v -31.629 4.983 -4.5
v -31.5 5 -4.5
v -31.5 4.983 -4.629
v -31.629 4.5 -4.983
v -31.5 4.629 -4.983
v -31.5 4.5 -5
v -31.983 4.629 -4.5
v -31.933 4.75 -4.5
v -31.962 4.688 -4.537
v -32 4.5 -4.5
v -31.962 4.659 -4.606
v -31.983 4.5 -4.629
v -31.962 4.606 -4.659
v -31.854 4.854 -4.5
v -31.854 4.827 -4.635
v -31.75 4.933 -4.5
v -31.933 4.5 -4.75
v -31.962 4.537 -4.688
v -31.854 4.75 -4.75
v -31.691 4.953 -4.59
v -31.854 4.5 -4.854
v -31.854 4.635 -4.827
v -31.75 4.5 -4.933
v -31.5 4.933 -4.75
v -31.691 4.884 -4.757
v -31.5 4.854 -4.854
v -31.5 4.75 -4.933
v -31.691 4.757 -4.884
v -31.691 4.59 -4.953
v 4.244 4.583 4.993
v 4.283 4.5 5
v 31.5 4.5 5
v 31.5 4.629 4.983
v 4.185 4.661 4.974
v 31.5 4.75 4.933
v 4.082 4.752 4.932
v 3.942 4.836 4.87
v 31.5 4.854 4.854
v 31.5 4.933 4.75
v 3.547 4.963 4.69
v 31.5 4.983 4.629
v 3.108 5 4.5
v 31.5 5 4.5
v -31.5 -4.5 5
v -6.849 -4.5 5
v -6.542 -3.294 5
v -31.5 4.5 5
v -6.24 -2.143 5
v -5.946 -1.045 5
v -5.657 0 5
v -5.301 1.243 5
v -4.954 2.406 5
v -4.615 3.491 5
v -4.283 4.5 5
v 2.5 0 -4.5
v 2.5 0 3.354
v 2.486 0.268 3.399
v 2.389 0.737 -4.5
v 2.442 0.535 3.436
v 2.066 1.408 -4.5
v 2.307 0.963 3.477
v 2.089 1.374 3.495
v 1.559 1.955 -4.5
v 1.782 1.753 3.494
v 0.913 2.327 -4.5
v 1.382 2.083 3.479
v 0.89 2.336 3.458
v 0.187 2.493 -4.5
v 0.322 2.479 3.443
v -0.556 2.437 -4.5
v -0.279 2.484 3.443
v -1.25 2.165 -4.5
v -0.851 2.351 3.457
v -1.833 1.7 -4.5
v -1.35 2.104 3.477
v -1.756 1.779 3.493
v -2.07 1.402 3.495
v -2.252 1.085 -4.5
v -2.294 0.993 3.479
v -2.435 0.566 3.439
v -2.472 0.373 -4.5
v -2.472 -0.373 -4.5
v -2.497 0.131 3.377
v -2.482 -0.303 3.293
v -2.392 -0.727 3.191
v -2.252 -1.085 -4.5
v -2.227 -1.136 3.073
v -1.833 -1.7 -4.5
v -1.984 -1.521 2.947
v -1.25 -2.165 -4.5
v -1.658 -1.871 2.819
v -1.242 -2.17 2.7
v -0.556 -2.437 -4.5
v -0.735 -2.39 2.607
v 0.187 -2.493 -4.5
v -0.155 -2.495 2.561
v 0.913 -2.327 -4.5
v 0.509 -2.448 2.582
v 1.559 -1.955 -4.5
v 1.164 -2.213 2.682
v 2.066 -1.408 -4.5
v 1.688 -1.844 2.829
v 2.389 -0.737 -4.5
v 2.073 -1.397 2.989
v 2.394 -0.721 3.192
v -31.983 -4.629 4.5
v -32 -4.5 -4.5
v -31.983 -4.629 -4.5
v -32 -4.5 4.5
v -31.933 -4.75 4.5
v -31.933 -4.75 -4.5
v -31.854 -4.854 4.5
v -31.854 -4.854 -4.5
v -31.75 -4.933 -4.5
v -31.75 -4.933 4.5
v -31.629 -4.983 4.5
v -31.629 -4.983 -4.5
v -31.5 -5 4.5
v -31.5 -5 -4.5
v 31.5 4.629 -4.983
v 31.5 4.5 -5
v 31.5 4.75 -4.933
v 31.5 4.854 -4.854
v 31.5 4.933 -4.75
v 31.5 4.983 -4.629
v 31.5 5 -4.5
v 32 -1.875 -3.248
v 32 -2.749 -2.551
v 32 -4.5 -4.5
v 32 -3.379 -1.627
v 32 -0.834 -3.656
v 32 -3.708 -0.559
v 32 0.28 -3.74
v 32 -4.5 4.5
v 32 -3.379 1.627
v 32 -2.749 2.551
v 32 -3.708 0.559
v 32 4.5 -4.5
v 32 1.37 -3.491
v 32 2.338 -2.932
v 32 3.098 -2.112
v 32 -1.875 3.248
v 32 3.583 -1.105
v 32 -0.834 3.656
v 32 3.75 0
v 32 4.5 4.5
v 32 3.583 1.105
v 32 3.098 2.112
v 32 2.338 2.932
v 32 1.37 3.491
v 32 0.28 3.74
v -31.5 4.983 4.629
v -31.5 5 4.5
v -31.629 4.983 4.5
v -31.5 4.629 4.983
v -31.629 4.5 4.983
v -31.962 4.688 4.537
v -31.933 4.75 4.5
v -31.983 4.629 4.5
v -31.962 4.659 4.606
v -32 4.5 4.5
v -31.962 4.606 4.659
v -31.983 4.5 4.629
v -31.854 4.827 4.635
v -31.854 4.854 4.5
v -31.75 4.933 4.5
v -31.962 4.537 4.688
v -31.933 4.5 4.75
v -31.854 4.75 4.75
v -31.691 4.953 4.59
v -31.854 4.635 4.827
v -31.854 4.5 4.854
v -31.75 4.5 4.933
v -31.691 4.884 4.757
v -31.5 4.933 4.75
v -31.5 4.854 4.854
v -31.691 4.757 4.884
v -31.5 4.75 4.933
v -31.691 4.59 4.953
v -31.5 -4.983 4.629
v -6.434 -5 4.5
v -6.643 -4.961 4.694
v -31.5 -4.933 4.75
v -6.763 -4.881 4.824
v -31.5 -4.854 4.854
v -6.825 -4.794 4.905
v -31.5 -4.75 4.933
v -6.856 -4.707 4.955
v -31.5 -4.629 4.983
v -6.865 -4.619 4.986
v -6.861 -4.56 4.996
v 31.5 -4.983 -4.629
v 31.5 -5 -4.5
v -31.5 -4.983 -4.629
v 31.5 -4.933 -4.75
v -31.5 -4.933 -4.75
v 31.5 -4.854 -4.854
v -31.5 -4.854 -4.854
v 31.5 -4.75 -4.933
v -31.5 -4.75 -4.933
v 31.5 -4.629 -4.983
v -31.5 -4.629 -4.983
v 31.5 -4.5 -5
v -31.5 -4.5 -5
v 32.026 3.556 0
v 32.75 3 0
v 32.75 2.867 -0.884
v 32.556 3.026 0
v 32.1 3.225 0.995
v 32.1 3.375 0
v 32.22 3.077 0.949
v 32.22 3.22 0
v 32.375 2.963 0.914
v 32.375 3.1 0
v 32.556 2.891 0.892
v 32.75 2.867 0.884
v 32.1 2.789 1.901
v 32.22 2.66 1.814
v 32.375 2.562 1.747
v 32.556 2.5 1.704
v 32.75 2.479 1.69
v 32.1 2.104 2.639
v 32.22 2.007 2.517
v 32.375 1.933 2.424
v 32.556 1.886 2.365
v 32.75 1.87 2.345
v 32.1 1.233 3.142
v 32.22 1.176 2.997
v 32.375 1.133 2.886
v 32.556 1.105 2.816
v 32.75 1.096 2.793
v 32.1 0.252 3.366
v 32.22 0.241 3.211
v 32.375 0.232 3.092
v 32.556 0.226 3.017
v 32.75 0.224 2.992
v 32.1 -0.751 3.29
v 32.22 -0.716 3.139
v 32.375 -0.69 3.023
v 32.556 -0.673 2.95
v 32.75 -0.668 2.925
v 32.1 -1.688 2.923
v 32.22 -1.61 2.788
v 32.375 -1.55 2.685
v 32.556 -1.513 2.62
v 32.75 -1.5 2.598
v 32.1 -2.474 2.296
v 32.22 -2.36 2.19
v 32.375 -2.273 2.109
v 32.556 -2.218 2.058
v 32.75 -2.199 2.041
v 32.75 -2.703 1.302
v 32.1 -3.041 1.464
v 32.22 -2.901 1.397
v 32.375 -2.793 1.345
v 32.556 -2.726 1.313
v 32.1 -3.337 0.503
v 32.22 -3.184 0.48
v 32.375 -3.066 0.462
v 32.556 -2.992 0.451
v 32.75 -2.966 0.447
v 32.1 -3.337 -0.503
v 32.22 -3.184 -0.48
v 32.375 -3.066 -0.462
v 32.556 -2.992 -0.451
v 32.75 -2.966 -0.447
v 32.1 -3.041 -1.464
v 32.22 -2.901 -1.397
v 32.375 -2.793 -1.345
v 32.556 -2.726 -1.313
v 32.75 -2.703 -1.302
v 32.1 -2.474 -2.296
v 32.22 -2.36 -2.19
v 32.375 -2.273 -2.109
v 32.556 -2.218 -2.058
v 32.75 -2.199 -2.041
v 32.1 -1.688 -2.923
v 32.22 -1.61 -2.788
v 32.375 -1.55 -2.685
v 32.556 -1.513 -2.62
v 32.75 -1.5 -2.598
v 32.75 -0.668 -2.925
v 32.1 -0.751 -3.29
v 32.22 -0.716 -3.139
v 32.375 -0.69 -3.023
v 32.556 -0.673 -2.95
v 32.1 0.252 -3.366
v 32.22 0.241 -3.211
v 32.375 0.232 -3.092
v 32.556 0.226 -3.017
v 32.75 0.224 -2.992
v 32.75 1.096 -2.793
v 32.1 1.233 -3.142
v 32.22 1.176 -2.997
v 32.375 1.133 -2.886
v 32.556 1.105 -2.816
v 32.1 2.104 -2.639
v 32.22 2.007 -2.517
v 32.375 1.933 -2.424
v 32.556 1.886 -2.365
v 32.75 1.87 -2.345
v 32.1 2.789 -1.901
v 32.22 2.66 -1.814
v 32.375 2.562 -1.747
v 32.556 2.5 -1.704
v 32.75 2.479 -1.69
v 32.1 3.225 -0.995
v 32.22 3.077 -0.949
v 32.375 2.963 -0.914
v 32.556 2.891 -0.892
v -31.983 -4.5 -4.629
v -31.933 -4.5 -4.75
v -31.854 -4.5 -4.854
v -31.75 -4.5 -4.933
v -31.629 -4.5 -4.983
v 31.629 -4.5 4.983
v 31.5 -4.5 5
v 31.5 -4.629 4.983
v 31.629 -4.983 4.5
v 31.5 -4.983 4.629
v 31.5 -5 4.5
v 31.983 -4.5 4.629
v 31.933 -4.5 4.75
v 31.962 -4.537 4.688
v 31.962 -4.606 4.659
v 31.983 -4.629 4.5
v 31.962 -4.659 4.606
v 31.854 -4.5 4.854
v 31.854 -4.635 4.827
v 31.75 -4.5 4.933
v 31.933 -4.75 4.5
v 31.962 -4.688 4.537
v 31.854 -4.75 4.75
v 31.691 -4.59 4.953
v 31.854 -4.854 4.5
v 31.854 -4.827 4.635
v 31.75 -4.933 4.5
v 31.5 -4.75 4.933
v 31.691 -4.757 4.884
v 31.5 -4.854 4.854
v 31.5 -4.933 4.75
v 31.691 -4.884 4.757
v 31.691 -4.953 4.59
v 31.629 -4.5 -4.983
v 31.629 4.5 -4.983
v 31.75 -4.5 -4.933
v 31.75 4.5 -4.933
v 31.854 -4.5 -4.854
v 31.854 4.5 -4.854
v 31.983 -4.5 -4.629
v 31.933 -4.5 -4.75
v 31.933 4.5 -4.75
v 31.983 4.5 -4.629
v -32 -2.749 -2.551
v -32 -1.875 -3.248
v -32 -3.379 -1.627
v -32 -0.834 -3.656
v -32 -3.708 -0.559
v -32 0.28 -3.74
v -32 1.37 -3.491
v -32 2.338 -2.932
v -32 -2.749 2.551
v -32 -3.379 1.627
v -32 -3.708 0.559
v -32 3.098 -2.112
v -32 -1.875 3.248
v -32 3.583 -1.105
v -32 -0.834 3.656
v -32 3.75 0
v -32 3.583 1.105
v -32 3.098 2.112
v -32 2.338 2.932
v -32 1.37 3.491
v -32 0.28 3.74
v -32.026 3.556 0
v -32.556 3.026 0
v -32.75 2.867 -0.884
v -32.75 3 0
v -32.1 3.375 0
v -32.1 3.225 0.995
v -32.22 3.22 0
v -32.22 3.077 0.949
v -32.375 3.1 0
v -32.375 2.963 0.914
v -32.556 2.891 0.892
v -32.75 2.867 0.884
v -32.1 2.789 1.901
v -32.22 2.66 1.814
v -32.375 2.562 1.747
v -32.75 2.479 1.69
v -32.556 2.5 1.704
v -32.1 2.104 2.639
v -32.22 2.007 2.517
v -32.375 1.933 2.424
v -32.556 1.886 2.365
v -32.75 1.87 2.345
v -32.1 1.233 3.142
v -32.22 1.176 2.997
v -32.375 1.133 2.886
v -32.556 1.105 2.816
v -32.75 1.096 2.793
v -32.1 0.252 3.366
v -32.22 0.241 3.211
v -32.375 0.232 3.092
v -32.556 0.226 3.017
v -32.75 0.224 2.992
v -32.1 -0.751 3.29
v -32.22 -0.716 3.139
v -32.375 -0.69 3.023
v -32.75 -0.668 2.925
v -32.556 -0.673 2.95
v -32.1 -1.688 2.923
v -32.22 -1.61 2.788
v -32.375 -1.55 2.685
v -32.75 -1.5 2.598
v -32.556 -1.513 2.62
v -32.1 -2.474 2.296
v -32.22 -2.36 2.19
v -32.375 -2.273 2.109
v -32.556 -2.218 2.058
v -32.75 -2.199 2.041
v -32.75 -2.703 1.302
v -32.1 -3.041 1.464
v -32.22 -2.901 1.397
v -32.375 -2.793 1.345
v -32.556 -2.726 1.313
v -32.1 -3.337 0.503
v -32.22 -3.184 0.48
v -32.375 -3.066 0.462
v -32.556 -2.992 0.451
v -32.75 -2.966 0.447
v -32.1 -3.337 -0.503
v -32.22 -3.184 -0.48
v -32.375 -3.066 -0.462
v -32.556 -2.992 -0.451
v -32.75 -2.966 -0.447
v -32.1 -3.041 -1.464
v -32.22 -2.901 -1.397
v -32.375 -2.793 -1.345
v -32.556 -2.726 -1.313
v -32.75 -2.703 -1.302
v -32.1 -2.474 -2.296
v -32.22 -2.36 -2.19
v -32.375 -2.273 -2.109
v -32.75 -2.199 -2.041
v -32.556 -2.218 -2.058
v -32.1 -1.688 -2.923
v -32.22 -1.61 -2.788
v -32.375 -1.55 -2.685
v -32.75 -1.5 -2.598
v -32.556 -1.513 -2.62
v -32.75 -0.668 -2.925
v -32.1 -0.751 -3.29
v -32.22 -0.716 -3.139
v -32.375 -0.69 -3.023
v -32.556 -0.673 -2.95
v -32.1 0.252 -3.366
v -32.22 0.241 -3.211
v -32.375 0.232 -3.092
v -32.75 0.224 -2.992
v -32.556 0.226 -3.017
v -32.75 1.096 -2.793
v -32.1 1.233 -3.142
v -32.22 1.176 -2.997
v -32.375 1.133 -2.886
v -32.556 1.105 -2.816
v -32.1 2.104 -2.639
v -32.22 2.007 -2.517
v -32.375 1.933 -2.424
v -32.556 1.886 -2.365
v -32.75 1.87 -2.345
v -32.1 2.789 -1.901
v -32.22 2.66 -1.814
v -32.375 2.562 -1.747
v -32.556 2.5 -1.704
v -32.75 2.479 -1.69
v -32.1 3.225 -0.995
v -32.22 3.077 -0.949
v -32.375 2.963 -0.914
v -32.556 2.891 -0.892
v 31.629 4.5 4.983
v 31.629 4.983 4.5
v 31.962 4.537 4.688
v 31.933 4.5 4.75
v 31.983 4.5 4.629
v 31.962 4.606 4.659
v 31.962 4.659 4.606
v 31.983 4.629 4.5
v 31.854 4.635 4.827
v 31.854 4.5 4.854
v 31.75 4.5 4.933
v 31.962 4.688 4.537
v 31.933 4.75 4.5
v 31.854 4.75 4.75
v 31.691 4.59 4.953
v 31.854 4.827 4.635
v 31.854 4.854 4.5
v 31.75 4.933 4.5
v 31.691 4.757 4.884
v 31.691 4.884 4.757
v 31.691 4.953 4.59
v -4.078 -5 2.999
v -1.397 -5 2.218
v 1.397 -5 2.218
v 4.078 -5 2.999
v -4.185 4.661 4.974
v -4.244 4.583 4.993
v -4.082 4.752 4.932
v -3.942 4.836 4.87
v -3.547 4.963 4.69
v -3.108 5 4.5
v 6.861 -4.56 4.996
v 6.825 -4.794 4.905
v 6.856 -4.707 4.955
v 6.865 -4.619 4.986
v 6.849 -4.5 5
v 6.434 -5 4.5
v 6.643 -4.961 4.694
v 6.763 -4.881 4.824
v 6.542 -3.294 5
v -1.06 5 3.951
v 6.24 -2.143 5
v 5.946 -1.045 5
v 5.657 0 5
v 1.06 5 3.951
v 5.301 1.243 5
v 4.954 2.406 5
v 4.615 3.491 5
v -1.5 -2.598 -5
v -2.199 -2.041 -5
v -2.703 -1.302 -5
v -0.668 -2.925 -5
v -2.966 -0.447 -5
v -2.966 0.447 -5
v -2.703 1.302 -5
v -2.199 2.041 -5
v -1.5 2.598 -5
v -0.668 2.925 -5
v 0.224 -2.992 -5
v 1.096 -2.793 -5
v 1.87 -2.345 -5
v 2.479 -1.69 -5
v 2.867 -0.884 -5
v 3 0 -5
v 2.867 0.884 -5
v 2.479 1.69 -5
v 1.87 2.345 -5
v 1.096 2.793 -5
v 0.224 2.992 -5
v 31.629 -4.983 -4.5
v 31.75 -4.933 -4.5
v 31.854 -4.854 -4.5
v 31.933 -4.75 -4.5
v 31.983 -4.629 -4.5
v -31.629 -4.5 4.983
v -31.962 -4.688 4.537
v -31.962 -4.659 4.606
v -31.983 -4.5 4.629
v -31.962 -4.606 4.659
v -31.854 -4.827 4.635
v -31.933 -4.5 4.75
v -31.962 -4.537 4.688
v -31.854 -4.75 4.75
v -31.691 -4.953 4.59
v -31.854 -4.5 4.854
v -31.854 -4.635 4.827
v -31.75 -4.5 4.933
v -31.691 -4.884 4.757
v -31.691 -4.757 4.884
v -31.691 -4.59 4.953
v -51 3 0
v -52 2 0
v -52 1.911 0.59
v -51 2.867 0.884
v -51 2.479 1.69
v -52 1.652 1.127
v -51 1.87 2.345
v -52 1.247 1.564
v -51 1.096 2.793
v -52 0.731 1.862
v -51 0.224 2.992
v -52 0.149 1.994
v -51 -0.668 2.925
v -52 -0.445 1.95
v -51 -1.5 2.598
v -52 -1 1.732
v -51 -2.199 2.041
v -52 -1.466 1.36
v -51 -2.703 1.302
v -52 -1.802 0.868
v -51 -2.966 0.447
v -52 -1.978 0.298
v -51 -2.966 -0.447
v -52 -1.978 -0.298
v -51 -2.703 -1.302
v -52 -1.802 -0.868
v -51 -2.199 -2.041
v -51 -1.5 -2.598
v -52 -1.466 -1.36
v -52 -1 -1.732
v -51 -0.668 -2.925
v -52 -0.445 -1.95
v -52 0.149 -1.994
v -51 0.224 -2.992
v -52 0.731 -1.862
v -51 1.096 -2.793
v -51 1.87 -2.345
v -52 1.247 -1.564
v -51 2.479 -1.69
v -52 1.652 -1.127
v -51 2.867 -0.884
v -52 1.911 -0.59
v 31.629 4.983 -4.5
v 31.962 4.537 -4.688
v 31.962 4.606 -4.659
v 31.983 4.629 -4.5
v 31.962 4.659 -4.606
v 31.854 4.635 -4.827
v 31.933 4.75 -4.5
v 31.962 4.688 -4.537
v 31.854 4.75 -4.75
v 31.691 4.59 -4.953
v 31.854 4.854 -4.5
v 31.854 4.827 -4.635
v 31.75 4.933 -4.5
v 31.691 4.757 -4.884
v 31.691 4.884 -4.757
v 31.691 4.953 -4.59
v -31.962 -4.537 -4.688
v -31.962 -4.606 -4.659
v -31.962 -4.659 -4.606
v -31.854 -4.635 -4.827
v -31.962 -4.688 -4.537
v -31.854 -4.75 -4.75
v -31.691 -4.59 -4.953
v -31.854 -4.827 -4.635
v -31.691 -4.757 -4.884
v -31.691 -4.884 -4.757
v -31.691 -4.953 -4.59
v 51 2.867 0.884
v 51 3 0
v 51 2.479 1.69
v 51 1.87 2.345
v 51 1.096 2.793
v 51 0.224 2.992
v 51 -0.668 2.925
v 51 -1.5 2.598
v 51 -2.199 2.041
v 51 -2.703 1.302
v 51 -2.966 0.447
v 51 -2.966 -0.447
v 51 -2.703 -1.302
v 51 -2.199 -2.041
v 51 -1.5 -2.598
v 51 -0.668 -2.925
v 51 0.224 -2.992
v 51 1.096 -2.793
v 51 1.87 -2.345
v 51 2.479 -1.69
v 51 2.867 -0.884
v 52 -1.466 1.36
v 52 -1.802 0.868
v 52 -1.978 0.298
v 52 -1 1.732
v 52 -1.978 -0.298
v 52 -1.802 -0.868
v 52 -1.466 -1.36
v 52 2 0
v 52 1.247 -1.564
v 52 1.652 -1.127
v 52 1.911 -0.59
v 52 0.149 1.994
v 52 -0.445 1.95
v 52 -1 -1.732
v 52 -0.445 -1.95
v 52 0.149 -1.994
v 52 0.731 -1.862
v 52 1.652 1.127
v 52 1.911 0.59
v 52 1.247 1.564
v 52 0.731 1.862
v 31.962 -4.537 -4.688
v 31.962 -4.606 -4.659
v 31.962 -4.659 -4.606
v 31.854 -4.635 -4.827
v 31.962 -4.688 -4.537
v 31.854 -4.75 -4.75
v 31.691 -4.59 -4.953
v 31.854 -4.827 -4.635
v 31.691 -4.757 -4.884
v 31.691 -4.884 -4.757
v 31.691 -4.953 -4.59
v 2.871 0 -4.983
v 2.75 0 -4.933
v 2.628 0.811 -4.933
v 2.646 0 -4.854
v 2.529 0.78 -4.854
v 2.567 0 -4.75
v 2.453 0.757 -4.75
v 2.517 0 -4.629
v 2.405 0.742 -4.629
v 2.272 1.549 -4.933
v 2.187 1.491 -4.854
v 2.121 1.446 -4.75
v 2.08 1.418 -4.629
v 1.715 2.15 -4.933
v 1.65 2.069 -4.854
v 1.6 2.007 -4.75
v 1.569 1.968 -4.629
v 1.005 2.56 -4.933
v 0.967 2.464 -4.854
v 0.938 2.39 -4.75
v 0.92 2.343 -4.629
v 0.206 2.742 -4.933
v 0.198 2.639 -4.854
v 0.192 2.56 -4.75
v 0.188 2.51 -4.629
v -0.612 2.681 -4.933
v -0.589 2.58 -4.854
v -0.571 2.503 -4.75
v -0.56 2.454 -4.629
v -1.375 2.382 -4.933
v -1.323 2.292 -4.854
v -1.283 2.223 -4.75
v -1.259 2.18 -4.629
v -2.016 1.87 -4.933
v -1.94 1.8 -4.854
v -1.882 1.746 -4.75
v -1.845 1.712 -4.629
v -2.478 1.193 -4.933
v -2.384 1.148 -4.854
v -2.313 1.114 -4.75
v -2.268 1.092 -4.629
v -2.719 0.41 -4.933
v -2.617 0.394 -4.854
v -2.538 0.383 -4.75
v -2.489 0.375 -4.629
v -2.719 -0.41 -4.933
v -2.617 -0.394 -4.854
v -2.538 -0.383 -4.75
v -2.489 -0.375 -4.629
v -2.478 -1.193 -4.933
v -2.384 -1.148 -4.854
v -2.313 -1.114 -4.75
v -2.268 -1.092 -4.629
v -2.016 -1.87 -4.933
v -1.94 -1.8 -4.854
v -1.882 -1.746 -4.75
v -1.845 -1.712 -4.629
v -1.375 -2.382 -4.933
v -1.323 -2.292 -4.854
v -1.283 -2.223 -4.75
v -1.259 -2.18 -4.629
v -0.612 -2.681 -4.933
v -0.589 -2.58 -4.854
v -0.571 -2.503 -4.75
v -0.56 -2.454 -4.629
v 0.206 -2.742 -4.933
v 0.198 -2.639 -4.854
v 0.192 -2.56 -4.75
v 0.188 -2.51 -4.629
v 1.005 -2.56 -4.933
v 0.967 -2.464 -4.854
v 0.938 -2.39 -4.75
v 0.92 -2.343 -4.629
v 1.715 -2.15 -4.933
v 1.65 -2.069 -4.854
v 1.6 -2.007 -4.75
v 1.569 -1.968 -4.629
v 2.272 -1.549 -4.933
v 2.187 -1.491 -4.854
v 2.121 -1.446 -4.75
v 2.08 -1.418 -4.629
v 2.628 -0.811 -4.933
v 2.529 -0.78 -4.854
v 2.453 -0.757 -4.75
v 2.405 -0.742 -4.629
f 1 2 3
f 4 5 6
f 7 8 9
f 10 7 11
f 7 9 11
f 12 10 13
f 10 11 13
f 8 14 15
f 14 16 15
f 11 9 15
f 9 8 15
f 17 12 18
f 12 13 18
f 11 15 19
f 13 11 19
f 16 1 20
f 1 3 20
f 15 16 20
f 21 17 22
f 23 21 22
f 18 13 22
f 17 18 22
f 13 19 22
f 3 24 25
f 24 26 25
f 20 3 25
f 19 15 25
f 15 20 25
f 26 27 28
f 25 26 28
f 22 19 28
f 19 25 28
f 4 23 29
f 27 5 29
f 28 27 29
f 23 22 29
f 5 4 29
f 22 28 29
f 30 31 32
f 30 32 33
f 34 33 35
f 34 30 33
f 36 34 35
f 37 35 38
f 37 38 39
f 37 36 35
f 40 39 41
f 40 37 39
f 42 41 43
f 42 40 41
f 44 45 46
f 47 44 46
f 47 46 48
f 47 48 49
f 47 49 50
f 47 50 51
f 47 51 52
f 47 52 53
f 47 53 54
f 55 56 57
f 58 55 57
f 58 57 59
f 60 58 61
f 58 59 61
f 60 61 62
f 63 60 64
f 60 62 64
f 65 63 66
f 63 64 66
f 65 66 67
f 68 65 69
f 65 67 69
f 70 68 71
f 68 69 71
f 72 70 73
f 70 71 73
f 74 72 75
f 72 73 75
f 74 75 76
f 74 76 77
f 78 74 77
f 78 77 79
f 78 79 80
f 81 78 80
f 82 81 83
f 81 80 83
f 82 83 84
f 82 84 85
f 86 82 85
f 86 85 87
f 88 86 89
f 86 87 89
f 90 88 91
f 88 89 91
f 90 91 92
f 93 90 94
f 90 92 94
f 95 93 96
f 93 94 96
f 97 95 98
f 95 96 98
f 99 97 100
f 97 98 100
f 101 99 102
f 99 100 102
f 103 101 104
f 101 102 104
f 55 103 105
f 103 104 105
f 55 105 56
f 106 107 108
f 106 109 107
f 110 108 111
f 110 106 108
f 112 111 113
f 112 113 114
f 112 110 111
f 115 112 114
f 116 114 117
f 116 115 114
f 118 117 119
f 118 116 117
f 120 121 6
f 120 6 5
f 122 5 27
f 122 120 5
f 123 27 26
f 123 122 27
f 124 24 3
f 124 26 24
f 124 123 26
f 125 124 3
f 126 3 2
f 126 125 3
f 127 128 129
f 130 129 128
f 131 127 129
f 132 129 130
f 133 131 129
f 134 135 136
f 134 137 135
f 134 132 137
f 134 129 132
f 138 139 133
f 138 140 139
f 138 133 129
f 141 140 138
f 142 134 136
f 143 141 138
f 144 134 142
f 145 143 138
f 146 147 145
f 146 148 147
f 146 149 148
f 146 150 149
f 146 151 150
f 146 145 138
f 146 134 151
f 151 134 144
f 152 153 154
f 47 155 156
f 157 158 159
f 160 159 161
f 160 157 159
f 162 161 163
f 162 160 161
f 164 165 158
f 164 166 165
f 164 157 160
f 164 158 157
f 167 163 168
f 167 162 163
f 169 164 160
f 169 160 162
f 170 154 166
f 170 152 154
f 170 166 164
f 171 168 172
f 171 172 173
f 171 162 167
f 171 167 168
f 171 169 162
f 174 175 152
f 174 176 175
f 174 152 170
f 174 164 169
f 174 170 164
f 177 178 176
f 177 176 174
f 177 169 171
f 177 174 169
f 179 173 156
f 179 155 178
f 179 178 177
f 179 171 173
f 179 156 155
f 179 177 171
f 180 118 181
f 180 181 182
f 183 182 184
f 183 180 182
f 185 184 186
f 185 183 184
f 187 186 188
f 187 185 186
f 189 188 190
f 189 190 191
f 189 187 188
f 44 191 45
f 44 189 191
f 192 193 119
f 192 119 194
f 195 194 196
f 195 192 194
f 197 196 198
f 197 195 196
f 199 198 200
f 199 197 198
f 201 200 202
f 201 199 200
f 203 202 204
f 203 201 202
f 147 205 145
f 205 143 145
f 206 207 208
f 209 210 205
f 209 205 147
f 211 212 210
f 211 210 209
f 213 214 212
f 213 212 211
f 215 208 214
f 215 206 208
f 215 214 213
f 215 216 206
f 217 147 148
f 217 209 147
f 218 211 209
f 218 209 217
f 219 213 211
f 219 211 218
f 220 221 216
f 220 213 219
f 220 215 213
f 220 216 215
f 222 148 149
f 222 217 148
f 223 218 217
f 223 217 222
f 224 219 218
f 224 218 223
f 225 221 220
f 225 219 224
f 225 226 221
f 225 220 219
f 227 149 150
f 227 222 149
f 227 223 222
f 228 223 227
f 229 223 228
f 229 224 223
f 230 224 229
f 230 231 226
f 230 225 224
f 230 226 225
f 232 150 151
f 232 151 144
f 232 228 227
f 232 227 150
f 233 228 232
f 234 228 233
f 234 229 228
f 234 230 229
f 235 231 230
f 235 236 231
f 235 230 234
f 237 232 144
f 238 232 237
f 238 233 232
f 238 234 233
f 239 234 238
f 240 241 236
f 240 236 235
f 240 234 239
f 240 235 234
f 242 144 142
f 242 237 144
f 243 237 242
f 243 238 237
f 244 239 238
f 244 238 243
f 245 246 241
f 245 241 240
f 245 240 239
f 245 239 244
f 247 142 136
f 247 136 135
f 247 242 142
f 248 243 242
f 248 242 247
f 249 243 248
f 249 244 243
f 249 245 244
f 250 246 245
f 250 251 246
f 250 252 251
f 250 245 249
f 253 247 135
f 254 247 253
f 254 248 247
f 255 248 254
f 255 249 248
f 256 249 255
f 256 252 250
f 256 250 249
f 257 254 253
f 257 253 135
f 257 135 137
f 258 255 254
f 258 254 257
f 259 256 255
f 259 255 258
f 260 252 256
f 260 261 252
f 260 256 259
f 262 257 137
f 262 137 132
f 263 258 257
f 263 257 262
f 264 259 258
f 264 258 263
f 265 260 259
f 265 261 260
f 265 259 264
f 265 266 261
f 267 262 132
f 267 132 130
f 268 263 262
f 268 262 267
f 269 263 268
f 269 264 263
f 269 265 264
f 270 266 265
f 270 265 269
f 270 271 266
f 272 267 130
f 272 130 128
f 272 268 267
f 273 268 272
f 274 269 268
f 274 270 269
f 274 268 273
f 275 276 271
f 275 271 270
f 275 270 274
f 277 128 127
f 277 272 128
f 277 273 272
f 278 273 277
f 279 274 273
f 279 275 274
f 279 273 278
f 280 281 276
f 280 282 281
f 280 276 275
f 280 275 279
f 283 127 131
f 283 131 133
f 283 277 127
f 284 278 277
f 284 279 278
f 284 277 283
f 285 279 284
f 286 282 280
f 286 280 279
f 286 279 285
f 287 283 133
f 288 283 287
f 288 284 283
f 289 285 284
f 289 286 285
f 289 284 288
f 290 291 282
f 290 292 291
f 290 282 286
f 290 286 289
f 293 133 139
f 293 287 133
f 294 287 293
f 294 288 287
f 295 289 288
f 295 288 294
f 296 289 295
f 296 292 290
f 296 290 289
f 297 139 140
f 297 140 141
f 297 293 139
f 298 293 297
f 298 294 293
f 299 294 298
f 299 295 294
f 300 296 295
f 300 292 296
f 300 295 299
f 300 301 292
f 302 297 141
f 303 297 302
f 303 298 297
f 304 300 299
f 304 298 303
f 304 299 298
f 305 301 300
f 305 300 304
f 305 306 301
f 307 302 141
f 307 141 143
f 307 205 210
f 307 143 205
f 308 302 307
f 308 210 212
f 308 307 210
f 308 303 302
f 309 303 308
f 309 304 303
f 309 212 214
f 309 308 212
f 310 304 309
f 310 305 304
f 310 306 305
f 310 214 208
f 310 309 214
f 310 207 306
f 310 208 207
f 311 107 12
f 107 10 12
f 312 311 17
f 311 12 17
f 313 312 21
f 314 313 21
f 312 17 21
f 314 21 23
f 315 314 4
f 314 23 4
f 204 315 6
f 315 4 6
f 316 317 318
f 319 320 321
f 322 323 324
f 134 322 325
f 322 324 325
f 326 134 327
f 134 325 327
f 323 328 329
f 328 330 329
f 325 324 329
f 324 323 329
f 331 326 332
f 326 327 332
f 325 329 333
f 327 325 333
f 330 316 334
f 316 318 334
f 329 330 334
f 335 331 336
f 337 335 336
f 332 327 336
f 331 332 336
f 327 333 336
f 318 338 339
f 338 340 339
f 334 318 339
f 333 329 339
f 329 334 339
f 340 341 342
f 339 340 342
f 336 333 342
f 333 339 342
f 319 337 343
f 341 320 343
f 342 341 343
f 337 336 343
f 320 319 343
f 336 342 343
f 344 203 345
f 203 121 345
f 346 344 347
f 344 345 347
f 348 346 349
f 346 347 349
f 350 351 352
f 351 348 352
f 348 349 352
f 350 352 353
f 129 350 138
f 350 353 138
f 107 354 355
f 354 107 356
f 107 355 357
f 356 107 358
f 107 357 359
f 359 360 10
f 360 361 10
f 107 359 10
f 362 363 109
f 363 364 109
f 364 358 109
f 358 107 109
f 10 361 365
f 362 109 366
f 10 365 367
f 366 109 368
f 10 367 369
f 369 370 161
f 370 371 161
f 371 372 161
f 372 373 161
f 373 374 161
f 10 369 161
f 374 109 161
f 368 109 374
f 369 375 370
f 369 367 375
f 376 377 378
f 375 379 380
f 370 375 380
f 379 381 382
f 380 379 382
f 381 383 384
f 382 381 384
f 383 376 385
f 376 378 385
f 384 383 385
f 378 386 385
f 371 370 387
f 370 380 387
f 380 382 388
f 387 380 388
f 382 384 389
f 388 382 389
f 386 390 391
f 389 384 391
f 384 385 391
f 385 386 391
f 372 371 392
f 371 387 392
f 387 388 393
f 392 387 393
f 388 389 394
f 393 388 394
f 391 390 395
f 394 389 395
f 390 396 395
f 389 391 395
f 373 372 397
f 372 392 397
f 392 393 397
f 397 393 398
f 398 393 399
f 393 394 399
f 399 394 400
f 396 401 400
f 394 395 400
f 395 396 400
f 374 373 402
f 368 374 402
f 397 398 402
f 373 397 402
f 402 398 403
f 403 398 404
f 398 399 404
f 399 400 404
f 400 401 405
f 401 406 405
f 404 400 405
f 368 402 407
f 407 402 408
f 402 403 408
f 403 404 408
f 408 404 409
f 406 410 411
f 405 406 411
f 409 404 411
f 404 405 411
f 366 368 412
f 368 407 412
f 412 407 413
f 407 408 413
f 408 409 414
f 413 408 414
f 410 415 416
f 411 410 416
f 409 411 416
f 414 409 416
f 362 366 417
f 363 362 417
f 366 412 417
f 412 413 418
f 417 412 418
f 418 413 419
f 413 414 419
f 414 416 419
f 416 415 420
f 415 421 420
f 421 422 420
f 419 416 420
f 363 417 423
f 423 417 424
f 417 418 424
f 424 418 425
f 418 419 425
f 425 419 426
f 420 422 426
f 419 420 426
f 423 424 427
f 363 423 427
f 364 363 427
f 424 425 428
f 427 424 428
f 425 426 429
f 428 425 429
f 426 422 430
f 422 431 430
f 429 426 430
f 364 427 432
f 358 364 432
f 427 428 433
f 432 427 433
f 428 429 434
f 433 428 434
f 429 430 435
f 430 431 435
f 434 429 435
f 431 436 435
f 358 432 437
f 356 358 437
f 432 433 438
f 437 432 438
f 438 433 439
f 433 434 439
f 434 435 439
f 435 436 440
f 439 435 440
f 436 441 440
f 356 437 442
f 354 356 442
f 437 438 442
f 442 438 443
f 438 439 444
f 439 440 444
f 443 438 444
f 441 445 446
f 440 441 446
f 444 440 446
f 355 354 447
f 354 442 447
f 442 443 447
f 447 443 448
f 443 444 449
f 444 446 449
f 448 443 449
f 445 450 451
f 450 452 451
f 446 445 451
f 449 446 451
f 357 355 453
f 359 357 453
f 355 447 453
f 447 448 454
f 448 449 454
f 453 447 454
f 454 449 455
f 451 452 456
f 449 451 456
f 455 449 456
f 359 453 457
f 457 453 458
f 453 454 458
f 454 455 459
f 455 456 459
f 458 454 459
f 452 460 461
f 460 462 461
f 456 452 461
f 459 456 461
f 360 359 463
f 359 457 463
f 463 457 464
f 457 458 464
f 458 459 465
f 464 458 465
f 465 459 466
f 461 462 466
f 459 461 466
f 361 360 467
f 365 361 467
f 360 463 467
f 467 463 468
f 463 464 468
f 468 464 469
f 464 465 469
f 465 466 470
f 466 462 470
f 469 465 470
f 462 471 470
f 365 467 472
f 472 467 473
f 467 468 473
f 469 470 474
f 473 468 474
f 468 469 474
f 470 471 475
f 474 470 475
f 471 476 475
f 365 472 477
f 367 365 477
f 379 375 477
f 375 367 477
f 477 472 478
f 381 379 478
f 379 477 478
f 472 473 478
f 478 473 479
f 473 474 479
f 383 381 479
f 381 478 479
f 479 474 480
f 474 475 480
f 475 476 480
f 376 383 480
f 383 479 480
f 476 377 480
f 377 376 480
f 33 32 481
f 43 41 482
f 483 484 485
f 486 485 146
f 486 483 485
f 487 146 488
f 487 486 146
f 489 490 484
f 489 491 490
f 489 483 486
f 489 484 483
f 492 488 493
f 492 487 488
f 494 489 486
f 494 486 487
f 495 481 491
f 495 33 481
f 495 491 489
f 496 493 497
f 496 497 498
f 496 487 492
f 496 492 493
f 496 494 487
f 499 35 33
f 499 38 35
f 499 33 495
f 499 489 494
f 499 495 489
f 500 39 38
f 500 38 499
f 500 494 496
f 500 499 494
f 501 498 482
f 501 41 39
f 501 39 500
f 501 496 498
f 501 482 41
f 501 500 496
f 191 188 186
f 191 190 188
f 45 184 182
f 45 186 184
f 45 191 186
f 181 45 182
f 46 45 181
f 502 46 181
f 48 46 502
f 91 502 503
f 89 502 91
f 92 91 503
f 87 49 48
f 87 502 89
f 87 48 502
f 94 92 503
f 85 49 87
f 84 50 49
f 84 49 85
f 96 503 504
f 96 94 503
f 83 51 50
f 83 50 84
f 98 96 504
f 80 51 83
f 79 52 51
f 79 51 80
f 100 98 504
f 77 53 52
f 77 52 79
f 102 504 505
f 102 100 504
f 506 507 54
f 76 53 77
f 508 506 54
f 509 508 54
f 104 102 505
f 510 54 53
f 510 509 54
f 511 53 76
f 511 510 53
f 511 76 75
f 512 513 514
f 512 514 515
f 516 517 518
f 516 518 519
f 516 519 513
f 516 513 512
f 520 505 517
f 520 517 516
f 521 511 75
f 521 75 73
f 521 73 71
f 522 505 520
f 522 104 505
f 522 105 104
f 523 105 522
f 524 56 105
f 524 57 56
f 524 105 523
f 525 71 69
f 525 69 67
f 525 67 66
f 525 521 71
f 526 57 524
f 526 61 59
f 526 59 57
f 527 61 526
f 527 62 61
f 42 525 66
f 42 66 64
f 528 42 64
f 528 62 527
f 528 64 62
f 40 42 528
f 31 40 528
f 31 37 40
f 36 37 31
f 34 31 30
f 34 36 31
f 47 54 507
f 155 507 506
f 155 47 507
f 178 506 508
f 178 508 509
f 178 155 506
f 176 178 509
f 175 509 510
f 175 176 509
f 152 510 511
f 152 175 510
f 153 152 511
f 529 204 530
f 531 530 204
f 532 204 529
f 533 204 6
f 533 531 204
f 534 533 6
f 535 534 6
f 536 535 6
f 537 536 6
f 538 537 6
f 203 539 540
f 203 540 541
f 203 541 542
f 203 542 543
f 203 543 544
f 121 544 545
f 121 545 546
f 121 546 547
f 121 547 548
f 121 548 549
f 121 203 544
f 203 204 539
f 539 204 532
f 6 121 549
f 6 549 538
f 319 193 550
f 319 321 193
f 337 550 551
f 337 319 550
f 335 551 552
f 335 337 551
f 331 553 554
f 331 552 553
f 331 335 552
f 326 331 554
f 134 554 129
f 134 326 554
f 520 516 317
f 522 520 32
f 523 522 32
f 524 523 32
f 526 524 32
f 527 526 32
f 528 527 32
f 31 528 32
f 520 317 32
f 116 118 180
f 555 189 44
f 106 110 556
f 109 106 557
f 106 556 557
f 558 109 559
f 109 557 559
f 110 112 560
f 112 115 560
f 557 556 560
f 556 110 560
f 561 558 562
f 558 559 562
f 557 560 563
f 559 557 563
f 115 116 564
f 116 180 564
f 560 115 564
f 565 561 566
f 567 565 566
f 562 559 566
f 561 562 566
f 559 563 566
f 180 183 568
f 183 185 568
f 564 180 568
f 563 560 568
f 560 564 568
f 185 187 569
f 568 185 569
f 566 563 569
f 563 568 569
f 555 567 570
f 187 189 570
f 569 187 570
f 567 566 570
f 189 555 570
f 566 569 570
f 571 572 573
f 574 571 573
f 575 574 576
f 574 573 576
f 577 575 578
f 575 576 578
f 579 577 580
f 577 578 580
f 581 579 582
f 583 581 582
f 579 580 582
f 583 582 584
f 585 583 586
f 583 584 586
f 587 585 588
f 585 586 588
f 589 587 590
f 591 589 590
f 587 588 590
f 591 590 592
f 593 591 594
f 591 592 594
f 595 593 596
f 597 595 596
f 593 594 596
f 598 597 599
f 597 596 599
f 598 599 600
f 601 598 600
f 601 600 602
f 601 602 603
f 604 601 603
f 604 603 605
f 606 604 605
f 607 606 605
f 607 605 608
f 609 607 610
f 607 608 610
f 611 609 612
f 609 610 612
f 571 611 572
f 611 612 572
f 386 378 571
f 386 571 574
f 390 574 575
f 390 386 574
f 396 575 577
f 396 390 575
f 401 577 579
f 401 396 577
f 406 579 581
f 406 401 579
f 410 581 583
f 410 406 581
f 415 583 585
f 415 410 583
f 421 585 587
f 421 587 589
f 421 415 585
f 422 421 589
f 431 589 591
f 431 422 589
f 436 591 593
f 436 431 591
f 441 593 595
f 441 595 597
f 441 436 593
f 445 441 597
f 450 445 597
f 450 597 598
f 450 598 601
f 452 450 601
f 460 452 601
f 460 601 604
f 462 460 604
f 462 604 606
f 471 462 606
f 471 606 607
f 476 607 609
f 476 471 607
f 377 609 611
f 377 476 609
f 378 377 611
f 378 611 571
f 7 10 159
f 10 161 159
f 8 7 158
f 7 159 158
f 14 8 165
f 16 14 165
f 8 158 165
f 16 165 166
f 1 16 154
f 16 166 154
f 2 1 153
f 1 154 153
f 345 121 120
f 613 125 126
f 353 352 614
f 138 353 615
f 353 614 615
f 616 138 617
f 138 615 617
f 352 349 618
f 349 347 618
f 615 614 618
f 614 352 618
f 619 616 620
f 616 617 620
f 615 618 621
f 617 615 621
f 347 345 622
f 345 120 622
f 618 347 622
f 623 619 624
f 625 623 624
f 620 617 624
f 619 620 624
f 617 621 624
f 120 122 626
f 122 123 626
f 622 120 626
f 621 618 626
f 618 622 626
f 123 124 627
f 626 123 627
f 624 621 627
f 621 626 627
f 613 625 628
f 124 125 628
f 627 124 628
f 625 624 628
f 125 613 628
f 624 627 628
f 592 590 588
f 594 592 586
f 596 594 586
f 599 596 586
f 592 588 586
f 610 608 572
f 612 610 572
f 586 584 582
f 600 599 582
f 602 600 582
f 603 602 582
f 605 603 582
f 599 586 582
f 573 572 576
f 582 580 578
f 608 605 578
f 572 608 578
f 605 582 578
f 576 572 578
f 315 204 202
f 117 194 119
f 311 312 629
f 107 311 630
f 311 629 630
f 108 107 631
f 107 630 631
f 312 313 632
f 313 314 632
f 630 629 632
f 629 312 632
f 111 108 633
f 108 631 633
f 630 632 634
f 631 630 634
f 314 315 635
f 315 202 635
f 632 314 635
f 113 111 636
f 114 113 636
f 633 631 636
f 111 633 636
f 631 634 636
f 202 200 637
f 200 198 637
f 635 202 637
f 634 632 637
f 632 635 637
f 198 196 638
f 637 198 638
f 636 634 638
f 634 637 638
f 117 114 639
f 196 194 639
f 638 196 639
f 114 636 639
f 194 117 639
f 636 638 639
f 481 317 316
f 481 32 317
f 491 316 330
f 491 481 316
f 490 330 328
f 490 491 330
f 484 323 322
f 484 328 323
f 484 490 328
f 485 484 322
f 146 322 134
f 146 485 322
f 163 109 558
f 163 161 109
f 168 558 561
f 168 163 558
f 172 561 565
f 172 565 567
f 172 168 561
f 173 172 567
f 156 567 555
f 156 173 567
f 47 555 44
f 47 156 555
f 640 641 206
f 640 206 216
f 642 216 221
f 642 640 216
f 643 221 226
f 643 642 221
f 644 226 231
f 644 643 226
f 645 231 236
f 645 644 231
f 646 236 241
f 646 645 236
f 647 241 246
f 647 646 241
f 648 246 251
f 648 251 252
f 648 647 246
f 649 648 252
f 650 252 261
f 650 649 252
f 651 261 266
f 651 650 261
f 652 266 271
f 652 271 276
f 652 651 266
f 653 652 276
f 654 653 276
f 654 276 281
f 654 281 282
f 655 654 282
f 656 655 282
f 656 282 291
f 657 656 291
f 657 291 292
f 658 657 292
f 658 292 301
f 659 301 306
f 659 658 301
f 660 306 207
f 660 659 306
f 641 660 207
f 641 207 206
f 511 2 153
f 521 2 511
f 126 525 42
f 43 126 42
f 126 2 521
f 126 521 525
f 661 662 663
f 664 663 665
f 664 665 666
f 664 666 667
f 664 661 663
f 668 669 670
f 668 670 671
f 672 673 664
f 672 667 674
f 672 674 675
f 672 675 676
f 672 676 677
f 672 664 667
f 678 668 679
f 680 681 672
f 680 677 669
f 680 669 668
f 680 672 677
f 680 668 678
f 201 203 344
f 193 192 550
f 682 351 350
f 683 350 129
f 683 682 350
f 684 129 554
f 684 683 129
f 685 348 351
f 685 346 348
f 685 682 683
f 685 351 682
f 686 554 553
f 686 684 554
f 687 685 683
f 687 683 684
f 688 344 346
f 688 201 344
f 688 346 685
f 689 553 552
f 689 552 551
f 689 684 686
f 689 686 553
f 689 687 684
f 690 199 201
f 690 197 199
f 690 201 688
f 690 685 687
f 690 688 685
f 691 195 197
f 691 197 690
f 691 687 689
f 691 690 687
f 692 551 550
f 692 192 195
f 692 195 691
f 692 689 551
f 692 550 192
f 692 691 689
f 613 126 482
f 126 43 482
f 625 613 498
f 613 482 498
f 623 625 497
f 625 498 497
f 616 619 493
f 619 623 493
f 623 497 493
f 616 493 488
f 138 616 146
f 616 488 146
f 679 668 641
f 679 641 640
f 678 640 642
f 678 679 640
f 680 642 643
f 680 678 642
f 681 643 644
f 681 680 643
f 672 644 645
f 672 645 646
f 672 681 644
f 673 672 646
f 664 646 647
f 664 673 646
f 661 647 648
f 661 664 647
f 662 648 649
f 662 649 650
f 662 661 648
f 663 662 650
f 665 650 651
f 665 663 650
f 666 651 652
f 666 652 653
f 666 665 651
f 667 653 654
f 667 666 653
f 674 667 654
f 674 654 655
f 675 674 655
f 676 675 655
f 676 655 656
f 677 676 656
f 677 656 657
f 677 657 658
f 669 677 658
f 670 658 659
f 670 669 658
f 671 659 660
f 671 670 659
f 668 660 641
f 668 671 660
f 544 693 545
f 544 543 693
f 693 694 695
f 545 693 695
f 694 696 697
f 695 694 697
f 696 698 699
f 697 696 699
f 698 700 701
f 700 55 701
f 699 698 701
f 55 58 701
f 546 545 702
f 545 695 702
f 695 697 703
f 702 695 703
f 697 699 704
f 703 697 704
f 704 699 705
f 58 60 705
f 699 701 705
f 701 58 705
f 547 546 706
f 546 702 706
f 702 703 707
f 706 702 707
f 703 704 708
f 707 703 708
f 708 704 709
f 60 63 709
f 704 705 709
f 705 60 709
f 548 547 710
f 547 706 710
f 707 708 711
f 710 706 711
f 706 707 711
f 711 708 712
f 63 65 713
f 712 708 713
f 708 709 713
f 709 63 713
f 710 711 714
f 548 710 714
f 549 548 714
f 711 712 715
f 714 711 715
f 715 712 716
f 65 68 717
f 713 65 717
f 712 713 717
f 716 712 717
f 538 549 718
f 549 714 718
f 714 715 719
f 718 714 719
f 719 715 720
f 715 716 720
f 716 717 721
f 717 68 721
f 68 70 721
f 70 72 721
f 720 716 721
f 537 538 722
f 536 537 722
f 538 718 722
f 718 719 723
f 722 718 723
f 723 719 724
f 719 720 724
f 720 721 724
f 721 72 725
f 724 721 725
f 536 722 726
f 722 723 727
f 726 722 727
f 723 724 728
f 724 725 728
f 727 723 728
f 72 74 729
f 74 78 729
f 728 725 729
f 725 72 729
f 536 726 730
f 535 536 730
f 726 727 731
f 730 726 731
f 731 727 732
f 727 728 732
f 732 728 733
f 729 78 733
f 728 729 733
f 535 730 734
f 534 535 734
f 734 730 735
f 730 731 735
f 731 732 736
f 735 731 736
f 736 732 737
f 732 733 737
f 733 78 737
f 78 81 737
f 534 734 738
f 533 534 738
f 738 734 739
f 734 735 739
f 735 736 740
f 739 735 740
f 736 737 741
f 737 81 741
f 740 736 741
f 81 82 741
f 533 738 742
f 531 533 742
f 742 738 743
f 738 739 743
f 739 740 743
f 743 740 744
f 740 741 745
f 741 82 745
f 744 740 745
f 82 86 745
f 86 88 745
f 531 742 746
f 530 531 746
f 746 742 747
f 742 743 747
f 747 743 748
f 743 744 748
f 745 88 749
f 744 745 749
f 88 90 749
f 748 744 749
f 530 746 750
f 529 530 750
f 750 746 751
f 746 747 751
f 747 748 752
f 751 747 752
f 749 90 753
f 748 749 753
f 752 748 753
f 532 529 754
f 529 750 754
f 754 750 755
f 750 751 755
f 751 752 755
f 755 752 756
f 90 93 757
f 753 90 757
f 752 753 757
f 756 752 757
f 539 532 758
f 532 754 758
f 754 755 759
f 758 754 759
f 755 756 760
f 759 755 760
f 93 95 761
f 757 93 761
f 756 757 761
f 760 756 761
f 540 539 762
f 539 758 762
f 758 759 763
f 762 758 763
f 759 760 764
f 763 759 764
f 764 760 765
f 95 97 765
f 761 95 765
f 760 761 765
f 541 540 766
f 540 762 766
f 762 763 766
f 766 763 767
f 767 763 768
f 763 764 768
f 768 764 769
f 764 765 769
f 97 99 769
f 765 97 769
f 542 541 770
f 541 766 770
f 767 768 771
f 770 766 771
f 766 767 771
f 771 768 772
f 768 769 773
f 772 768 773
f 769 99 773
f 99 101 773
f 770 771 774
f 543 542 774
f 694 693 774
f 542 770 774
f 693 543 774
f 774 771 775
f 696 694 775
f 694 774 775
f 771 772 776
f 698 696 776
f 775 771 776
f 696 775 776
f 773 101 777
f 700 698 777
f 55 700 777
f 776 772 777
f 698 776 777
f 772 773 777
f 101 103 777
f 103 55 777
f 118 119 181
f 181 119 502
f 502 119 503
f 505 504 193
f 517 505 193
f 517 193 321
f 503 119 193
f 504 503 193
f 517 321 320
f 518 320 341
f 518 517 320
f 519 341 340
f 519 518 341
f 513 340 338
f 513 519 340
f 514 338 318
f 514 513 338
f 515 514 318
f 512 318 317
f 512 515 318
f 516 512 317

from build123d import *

# Parameters (mm, degrees)
F0_W           = 10
F0_H           = 10
F1_DEPTH       = 32
F2_R           = 3
F3_DEPTH       = 52
F4_R           = 2.5
F5_DEPTH       = 12.5
F6_SIZE        = 1
F7_R           = 0.5
F8_R           = 0.75
F9_R           = 9
F10_DEPTH      = 25
F10_TAPER      = -10
F10_DEPTH_BACK = 25
F10_TAPER_BACK = 10


with BuildPart() as f1:
    # F0 (on Right) → F1 (new body, symmetric)
    with BuildSketch(Plane.YZ):
        Rectangle(F0_W, F0_H)
    extrude(amount=F1_DEPTH, both=True)

    # F2 (on Right) → F3 (join, symmetric)
    with BuildSketch(Plane.YZ):
        Circle(F2_R)
    extrude(amount=F3_DEPTH, both=True)

    # F4 (on Top) → F5 (cut, symmetric)
    with BuildSketch(Plane.XY):
        Circle(F4_R)
    extrude(amount=F5_DEPTH, both=True, mode=Mode.SUBTRACT)

    # F6
    f6_edges = [f1.edges().sort_by_distance(p)[0] for p in [
        (52, -3, 0),
        (-52, -3, 0),
    ]]
    chamfer(f6_edges, length=F6_SIZE)

    # F7
    f7_edges = [f1.edges().sort_by_distance(p)[0] for p in [
        (0, -5, 5),
        (0, 5, 5),
        (0, -5, -5),
        (0, 5, -5),
        (-32, 5, 0),
        (-32, 0, -5),
        (32, 0, -5),
        (-2.5, 0, -5),
        (-32, -5, 0),
        (-32, 0, 5),
        (32, 0, 5),
        (32, -5, 0),
        (32, 5, 0),
    ]]
    fillet(f7_edges, radius=F7_R)

    # F8
    f8_edges = [f1.edges().sort_by_distance(p)[0] for p in [
        (32, -3, 0),
        (-32, -3, 0),
    ]]
    fillet(f8_edges, radius=F8_R)

    # F9 (on Front) → F10 (cut, two sides)
    with BuildSketch(Plane.XZ) as f10_sk:
        with Locations((0, 12)):
            Circle(F9_R)
    extrude(amount=F10_DEPTH, taper=F10_TAPER, mode=Mode.SUBTRACT)
    extrude(f10_sk.sketch, amount=-F10_DEPTH_BACK, taper=F10_TAPER_BACK, mode=Mode.SUBTRACT)


solid = f1.part
